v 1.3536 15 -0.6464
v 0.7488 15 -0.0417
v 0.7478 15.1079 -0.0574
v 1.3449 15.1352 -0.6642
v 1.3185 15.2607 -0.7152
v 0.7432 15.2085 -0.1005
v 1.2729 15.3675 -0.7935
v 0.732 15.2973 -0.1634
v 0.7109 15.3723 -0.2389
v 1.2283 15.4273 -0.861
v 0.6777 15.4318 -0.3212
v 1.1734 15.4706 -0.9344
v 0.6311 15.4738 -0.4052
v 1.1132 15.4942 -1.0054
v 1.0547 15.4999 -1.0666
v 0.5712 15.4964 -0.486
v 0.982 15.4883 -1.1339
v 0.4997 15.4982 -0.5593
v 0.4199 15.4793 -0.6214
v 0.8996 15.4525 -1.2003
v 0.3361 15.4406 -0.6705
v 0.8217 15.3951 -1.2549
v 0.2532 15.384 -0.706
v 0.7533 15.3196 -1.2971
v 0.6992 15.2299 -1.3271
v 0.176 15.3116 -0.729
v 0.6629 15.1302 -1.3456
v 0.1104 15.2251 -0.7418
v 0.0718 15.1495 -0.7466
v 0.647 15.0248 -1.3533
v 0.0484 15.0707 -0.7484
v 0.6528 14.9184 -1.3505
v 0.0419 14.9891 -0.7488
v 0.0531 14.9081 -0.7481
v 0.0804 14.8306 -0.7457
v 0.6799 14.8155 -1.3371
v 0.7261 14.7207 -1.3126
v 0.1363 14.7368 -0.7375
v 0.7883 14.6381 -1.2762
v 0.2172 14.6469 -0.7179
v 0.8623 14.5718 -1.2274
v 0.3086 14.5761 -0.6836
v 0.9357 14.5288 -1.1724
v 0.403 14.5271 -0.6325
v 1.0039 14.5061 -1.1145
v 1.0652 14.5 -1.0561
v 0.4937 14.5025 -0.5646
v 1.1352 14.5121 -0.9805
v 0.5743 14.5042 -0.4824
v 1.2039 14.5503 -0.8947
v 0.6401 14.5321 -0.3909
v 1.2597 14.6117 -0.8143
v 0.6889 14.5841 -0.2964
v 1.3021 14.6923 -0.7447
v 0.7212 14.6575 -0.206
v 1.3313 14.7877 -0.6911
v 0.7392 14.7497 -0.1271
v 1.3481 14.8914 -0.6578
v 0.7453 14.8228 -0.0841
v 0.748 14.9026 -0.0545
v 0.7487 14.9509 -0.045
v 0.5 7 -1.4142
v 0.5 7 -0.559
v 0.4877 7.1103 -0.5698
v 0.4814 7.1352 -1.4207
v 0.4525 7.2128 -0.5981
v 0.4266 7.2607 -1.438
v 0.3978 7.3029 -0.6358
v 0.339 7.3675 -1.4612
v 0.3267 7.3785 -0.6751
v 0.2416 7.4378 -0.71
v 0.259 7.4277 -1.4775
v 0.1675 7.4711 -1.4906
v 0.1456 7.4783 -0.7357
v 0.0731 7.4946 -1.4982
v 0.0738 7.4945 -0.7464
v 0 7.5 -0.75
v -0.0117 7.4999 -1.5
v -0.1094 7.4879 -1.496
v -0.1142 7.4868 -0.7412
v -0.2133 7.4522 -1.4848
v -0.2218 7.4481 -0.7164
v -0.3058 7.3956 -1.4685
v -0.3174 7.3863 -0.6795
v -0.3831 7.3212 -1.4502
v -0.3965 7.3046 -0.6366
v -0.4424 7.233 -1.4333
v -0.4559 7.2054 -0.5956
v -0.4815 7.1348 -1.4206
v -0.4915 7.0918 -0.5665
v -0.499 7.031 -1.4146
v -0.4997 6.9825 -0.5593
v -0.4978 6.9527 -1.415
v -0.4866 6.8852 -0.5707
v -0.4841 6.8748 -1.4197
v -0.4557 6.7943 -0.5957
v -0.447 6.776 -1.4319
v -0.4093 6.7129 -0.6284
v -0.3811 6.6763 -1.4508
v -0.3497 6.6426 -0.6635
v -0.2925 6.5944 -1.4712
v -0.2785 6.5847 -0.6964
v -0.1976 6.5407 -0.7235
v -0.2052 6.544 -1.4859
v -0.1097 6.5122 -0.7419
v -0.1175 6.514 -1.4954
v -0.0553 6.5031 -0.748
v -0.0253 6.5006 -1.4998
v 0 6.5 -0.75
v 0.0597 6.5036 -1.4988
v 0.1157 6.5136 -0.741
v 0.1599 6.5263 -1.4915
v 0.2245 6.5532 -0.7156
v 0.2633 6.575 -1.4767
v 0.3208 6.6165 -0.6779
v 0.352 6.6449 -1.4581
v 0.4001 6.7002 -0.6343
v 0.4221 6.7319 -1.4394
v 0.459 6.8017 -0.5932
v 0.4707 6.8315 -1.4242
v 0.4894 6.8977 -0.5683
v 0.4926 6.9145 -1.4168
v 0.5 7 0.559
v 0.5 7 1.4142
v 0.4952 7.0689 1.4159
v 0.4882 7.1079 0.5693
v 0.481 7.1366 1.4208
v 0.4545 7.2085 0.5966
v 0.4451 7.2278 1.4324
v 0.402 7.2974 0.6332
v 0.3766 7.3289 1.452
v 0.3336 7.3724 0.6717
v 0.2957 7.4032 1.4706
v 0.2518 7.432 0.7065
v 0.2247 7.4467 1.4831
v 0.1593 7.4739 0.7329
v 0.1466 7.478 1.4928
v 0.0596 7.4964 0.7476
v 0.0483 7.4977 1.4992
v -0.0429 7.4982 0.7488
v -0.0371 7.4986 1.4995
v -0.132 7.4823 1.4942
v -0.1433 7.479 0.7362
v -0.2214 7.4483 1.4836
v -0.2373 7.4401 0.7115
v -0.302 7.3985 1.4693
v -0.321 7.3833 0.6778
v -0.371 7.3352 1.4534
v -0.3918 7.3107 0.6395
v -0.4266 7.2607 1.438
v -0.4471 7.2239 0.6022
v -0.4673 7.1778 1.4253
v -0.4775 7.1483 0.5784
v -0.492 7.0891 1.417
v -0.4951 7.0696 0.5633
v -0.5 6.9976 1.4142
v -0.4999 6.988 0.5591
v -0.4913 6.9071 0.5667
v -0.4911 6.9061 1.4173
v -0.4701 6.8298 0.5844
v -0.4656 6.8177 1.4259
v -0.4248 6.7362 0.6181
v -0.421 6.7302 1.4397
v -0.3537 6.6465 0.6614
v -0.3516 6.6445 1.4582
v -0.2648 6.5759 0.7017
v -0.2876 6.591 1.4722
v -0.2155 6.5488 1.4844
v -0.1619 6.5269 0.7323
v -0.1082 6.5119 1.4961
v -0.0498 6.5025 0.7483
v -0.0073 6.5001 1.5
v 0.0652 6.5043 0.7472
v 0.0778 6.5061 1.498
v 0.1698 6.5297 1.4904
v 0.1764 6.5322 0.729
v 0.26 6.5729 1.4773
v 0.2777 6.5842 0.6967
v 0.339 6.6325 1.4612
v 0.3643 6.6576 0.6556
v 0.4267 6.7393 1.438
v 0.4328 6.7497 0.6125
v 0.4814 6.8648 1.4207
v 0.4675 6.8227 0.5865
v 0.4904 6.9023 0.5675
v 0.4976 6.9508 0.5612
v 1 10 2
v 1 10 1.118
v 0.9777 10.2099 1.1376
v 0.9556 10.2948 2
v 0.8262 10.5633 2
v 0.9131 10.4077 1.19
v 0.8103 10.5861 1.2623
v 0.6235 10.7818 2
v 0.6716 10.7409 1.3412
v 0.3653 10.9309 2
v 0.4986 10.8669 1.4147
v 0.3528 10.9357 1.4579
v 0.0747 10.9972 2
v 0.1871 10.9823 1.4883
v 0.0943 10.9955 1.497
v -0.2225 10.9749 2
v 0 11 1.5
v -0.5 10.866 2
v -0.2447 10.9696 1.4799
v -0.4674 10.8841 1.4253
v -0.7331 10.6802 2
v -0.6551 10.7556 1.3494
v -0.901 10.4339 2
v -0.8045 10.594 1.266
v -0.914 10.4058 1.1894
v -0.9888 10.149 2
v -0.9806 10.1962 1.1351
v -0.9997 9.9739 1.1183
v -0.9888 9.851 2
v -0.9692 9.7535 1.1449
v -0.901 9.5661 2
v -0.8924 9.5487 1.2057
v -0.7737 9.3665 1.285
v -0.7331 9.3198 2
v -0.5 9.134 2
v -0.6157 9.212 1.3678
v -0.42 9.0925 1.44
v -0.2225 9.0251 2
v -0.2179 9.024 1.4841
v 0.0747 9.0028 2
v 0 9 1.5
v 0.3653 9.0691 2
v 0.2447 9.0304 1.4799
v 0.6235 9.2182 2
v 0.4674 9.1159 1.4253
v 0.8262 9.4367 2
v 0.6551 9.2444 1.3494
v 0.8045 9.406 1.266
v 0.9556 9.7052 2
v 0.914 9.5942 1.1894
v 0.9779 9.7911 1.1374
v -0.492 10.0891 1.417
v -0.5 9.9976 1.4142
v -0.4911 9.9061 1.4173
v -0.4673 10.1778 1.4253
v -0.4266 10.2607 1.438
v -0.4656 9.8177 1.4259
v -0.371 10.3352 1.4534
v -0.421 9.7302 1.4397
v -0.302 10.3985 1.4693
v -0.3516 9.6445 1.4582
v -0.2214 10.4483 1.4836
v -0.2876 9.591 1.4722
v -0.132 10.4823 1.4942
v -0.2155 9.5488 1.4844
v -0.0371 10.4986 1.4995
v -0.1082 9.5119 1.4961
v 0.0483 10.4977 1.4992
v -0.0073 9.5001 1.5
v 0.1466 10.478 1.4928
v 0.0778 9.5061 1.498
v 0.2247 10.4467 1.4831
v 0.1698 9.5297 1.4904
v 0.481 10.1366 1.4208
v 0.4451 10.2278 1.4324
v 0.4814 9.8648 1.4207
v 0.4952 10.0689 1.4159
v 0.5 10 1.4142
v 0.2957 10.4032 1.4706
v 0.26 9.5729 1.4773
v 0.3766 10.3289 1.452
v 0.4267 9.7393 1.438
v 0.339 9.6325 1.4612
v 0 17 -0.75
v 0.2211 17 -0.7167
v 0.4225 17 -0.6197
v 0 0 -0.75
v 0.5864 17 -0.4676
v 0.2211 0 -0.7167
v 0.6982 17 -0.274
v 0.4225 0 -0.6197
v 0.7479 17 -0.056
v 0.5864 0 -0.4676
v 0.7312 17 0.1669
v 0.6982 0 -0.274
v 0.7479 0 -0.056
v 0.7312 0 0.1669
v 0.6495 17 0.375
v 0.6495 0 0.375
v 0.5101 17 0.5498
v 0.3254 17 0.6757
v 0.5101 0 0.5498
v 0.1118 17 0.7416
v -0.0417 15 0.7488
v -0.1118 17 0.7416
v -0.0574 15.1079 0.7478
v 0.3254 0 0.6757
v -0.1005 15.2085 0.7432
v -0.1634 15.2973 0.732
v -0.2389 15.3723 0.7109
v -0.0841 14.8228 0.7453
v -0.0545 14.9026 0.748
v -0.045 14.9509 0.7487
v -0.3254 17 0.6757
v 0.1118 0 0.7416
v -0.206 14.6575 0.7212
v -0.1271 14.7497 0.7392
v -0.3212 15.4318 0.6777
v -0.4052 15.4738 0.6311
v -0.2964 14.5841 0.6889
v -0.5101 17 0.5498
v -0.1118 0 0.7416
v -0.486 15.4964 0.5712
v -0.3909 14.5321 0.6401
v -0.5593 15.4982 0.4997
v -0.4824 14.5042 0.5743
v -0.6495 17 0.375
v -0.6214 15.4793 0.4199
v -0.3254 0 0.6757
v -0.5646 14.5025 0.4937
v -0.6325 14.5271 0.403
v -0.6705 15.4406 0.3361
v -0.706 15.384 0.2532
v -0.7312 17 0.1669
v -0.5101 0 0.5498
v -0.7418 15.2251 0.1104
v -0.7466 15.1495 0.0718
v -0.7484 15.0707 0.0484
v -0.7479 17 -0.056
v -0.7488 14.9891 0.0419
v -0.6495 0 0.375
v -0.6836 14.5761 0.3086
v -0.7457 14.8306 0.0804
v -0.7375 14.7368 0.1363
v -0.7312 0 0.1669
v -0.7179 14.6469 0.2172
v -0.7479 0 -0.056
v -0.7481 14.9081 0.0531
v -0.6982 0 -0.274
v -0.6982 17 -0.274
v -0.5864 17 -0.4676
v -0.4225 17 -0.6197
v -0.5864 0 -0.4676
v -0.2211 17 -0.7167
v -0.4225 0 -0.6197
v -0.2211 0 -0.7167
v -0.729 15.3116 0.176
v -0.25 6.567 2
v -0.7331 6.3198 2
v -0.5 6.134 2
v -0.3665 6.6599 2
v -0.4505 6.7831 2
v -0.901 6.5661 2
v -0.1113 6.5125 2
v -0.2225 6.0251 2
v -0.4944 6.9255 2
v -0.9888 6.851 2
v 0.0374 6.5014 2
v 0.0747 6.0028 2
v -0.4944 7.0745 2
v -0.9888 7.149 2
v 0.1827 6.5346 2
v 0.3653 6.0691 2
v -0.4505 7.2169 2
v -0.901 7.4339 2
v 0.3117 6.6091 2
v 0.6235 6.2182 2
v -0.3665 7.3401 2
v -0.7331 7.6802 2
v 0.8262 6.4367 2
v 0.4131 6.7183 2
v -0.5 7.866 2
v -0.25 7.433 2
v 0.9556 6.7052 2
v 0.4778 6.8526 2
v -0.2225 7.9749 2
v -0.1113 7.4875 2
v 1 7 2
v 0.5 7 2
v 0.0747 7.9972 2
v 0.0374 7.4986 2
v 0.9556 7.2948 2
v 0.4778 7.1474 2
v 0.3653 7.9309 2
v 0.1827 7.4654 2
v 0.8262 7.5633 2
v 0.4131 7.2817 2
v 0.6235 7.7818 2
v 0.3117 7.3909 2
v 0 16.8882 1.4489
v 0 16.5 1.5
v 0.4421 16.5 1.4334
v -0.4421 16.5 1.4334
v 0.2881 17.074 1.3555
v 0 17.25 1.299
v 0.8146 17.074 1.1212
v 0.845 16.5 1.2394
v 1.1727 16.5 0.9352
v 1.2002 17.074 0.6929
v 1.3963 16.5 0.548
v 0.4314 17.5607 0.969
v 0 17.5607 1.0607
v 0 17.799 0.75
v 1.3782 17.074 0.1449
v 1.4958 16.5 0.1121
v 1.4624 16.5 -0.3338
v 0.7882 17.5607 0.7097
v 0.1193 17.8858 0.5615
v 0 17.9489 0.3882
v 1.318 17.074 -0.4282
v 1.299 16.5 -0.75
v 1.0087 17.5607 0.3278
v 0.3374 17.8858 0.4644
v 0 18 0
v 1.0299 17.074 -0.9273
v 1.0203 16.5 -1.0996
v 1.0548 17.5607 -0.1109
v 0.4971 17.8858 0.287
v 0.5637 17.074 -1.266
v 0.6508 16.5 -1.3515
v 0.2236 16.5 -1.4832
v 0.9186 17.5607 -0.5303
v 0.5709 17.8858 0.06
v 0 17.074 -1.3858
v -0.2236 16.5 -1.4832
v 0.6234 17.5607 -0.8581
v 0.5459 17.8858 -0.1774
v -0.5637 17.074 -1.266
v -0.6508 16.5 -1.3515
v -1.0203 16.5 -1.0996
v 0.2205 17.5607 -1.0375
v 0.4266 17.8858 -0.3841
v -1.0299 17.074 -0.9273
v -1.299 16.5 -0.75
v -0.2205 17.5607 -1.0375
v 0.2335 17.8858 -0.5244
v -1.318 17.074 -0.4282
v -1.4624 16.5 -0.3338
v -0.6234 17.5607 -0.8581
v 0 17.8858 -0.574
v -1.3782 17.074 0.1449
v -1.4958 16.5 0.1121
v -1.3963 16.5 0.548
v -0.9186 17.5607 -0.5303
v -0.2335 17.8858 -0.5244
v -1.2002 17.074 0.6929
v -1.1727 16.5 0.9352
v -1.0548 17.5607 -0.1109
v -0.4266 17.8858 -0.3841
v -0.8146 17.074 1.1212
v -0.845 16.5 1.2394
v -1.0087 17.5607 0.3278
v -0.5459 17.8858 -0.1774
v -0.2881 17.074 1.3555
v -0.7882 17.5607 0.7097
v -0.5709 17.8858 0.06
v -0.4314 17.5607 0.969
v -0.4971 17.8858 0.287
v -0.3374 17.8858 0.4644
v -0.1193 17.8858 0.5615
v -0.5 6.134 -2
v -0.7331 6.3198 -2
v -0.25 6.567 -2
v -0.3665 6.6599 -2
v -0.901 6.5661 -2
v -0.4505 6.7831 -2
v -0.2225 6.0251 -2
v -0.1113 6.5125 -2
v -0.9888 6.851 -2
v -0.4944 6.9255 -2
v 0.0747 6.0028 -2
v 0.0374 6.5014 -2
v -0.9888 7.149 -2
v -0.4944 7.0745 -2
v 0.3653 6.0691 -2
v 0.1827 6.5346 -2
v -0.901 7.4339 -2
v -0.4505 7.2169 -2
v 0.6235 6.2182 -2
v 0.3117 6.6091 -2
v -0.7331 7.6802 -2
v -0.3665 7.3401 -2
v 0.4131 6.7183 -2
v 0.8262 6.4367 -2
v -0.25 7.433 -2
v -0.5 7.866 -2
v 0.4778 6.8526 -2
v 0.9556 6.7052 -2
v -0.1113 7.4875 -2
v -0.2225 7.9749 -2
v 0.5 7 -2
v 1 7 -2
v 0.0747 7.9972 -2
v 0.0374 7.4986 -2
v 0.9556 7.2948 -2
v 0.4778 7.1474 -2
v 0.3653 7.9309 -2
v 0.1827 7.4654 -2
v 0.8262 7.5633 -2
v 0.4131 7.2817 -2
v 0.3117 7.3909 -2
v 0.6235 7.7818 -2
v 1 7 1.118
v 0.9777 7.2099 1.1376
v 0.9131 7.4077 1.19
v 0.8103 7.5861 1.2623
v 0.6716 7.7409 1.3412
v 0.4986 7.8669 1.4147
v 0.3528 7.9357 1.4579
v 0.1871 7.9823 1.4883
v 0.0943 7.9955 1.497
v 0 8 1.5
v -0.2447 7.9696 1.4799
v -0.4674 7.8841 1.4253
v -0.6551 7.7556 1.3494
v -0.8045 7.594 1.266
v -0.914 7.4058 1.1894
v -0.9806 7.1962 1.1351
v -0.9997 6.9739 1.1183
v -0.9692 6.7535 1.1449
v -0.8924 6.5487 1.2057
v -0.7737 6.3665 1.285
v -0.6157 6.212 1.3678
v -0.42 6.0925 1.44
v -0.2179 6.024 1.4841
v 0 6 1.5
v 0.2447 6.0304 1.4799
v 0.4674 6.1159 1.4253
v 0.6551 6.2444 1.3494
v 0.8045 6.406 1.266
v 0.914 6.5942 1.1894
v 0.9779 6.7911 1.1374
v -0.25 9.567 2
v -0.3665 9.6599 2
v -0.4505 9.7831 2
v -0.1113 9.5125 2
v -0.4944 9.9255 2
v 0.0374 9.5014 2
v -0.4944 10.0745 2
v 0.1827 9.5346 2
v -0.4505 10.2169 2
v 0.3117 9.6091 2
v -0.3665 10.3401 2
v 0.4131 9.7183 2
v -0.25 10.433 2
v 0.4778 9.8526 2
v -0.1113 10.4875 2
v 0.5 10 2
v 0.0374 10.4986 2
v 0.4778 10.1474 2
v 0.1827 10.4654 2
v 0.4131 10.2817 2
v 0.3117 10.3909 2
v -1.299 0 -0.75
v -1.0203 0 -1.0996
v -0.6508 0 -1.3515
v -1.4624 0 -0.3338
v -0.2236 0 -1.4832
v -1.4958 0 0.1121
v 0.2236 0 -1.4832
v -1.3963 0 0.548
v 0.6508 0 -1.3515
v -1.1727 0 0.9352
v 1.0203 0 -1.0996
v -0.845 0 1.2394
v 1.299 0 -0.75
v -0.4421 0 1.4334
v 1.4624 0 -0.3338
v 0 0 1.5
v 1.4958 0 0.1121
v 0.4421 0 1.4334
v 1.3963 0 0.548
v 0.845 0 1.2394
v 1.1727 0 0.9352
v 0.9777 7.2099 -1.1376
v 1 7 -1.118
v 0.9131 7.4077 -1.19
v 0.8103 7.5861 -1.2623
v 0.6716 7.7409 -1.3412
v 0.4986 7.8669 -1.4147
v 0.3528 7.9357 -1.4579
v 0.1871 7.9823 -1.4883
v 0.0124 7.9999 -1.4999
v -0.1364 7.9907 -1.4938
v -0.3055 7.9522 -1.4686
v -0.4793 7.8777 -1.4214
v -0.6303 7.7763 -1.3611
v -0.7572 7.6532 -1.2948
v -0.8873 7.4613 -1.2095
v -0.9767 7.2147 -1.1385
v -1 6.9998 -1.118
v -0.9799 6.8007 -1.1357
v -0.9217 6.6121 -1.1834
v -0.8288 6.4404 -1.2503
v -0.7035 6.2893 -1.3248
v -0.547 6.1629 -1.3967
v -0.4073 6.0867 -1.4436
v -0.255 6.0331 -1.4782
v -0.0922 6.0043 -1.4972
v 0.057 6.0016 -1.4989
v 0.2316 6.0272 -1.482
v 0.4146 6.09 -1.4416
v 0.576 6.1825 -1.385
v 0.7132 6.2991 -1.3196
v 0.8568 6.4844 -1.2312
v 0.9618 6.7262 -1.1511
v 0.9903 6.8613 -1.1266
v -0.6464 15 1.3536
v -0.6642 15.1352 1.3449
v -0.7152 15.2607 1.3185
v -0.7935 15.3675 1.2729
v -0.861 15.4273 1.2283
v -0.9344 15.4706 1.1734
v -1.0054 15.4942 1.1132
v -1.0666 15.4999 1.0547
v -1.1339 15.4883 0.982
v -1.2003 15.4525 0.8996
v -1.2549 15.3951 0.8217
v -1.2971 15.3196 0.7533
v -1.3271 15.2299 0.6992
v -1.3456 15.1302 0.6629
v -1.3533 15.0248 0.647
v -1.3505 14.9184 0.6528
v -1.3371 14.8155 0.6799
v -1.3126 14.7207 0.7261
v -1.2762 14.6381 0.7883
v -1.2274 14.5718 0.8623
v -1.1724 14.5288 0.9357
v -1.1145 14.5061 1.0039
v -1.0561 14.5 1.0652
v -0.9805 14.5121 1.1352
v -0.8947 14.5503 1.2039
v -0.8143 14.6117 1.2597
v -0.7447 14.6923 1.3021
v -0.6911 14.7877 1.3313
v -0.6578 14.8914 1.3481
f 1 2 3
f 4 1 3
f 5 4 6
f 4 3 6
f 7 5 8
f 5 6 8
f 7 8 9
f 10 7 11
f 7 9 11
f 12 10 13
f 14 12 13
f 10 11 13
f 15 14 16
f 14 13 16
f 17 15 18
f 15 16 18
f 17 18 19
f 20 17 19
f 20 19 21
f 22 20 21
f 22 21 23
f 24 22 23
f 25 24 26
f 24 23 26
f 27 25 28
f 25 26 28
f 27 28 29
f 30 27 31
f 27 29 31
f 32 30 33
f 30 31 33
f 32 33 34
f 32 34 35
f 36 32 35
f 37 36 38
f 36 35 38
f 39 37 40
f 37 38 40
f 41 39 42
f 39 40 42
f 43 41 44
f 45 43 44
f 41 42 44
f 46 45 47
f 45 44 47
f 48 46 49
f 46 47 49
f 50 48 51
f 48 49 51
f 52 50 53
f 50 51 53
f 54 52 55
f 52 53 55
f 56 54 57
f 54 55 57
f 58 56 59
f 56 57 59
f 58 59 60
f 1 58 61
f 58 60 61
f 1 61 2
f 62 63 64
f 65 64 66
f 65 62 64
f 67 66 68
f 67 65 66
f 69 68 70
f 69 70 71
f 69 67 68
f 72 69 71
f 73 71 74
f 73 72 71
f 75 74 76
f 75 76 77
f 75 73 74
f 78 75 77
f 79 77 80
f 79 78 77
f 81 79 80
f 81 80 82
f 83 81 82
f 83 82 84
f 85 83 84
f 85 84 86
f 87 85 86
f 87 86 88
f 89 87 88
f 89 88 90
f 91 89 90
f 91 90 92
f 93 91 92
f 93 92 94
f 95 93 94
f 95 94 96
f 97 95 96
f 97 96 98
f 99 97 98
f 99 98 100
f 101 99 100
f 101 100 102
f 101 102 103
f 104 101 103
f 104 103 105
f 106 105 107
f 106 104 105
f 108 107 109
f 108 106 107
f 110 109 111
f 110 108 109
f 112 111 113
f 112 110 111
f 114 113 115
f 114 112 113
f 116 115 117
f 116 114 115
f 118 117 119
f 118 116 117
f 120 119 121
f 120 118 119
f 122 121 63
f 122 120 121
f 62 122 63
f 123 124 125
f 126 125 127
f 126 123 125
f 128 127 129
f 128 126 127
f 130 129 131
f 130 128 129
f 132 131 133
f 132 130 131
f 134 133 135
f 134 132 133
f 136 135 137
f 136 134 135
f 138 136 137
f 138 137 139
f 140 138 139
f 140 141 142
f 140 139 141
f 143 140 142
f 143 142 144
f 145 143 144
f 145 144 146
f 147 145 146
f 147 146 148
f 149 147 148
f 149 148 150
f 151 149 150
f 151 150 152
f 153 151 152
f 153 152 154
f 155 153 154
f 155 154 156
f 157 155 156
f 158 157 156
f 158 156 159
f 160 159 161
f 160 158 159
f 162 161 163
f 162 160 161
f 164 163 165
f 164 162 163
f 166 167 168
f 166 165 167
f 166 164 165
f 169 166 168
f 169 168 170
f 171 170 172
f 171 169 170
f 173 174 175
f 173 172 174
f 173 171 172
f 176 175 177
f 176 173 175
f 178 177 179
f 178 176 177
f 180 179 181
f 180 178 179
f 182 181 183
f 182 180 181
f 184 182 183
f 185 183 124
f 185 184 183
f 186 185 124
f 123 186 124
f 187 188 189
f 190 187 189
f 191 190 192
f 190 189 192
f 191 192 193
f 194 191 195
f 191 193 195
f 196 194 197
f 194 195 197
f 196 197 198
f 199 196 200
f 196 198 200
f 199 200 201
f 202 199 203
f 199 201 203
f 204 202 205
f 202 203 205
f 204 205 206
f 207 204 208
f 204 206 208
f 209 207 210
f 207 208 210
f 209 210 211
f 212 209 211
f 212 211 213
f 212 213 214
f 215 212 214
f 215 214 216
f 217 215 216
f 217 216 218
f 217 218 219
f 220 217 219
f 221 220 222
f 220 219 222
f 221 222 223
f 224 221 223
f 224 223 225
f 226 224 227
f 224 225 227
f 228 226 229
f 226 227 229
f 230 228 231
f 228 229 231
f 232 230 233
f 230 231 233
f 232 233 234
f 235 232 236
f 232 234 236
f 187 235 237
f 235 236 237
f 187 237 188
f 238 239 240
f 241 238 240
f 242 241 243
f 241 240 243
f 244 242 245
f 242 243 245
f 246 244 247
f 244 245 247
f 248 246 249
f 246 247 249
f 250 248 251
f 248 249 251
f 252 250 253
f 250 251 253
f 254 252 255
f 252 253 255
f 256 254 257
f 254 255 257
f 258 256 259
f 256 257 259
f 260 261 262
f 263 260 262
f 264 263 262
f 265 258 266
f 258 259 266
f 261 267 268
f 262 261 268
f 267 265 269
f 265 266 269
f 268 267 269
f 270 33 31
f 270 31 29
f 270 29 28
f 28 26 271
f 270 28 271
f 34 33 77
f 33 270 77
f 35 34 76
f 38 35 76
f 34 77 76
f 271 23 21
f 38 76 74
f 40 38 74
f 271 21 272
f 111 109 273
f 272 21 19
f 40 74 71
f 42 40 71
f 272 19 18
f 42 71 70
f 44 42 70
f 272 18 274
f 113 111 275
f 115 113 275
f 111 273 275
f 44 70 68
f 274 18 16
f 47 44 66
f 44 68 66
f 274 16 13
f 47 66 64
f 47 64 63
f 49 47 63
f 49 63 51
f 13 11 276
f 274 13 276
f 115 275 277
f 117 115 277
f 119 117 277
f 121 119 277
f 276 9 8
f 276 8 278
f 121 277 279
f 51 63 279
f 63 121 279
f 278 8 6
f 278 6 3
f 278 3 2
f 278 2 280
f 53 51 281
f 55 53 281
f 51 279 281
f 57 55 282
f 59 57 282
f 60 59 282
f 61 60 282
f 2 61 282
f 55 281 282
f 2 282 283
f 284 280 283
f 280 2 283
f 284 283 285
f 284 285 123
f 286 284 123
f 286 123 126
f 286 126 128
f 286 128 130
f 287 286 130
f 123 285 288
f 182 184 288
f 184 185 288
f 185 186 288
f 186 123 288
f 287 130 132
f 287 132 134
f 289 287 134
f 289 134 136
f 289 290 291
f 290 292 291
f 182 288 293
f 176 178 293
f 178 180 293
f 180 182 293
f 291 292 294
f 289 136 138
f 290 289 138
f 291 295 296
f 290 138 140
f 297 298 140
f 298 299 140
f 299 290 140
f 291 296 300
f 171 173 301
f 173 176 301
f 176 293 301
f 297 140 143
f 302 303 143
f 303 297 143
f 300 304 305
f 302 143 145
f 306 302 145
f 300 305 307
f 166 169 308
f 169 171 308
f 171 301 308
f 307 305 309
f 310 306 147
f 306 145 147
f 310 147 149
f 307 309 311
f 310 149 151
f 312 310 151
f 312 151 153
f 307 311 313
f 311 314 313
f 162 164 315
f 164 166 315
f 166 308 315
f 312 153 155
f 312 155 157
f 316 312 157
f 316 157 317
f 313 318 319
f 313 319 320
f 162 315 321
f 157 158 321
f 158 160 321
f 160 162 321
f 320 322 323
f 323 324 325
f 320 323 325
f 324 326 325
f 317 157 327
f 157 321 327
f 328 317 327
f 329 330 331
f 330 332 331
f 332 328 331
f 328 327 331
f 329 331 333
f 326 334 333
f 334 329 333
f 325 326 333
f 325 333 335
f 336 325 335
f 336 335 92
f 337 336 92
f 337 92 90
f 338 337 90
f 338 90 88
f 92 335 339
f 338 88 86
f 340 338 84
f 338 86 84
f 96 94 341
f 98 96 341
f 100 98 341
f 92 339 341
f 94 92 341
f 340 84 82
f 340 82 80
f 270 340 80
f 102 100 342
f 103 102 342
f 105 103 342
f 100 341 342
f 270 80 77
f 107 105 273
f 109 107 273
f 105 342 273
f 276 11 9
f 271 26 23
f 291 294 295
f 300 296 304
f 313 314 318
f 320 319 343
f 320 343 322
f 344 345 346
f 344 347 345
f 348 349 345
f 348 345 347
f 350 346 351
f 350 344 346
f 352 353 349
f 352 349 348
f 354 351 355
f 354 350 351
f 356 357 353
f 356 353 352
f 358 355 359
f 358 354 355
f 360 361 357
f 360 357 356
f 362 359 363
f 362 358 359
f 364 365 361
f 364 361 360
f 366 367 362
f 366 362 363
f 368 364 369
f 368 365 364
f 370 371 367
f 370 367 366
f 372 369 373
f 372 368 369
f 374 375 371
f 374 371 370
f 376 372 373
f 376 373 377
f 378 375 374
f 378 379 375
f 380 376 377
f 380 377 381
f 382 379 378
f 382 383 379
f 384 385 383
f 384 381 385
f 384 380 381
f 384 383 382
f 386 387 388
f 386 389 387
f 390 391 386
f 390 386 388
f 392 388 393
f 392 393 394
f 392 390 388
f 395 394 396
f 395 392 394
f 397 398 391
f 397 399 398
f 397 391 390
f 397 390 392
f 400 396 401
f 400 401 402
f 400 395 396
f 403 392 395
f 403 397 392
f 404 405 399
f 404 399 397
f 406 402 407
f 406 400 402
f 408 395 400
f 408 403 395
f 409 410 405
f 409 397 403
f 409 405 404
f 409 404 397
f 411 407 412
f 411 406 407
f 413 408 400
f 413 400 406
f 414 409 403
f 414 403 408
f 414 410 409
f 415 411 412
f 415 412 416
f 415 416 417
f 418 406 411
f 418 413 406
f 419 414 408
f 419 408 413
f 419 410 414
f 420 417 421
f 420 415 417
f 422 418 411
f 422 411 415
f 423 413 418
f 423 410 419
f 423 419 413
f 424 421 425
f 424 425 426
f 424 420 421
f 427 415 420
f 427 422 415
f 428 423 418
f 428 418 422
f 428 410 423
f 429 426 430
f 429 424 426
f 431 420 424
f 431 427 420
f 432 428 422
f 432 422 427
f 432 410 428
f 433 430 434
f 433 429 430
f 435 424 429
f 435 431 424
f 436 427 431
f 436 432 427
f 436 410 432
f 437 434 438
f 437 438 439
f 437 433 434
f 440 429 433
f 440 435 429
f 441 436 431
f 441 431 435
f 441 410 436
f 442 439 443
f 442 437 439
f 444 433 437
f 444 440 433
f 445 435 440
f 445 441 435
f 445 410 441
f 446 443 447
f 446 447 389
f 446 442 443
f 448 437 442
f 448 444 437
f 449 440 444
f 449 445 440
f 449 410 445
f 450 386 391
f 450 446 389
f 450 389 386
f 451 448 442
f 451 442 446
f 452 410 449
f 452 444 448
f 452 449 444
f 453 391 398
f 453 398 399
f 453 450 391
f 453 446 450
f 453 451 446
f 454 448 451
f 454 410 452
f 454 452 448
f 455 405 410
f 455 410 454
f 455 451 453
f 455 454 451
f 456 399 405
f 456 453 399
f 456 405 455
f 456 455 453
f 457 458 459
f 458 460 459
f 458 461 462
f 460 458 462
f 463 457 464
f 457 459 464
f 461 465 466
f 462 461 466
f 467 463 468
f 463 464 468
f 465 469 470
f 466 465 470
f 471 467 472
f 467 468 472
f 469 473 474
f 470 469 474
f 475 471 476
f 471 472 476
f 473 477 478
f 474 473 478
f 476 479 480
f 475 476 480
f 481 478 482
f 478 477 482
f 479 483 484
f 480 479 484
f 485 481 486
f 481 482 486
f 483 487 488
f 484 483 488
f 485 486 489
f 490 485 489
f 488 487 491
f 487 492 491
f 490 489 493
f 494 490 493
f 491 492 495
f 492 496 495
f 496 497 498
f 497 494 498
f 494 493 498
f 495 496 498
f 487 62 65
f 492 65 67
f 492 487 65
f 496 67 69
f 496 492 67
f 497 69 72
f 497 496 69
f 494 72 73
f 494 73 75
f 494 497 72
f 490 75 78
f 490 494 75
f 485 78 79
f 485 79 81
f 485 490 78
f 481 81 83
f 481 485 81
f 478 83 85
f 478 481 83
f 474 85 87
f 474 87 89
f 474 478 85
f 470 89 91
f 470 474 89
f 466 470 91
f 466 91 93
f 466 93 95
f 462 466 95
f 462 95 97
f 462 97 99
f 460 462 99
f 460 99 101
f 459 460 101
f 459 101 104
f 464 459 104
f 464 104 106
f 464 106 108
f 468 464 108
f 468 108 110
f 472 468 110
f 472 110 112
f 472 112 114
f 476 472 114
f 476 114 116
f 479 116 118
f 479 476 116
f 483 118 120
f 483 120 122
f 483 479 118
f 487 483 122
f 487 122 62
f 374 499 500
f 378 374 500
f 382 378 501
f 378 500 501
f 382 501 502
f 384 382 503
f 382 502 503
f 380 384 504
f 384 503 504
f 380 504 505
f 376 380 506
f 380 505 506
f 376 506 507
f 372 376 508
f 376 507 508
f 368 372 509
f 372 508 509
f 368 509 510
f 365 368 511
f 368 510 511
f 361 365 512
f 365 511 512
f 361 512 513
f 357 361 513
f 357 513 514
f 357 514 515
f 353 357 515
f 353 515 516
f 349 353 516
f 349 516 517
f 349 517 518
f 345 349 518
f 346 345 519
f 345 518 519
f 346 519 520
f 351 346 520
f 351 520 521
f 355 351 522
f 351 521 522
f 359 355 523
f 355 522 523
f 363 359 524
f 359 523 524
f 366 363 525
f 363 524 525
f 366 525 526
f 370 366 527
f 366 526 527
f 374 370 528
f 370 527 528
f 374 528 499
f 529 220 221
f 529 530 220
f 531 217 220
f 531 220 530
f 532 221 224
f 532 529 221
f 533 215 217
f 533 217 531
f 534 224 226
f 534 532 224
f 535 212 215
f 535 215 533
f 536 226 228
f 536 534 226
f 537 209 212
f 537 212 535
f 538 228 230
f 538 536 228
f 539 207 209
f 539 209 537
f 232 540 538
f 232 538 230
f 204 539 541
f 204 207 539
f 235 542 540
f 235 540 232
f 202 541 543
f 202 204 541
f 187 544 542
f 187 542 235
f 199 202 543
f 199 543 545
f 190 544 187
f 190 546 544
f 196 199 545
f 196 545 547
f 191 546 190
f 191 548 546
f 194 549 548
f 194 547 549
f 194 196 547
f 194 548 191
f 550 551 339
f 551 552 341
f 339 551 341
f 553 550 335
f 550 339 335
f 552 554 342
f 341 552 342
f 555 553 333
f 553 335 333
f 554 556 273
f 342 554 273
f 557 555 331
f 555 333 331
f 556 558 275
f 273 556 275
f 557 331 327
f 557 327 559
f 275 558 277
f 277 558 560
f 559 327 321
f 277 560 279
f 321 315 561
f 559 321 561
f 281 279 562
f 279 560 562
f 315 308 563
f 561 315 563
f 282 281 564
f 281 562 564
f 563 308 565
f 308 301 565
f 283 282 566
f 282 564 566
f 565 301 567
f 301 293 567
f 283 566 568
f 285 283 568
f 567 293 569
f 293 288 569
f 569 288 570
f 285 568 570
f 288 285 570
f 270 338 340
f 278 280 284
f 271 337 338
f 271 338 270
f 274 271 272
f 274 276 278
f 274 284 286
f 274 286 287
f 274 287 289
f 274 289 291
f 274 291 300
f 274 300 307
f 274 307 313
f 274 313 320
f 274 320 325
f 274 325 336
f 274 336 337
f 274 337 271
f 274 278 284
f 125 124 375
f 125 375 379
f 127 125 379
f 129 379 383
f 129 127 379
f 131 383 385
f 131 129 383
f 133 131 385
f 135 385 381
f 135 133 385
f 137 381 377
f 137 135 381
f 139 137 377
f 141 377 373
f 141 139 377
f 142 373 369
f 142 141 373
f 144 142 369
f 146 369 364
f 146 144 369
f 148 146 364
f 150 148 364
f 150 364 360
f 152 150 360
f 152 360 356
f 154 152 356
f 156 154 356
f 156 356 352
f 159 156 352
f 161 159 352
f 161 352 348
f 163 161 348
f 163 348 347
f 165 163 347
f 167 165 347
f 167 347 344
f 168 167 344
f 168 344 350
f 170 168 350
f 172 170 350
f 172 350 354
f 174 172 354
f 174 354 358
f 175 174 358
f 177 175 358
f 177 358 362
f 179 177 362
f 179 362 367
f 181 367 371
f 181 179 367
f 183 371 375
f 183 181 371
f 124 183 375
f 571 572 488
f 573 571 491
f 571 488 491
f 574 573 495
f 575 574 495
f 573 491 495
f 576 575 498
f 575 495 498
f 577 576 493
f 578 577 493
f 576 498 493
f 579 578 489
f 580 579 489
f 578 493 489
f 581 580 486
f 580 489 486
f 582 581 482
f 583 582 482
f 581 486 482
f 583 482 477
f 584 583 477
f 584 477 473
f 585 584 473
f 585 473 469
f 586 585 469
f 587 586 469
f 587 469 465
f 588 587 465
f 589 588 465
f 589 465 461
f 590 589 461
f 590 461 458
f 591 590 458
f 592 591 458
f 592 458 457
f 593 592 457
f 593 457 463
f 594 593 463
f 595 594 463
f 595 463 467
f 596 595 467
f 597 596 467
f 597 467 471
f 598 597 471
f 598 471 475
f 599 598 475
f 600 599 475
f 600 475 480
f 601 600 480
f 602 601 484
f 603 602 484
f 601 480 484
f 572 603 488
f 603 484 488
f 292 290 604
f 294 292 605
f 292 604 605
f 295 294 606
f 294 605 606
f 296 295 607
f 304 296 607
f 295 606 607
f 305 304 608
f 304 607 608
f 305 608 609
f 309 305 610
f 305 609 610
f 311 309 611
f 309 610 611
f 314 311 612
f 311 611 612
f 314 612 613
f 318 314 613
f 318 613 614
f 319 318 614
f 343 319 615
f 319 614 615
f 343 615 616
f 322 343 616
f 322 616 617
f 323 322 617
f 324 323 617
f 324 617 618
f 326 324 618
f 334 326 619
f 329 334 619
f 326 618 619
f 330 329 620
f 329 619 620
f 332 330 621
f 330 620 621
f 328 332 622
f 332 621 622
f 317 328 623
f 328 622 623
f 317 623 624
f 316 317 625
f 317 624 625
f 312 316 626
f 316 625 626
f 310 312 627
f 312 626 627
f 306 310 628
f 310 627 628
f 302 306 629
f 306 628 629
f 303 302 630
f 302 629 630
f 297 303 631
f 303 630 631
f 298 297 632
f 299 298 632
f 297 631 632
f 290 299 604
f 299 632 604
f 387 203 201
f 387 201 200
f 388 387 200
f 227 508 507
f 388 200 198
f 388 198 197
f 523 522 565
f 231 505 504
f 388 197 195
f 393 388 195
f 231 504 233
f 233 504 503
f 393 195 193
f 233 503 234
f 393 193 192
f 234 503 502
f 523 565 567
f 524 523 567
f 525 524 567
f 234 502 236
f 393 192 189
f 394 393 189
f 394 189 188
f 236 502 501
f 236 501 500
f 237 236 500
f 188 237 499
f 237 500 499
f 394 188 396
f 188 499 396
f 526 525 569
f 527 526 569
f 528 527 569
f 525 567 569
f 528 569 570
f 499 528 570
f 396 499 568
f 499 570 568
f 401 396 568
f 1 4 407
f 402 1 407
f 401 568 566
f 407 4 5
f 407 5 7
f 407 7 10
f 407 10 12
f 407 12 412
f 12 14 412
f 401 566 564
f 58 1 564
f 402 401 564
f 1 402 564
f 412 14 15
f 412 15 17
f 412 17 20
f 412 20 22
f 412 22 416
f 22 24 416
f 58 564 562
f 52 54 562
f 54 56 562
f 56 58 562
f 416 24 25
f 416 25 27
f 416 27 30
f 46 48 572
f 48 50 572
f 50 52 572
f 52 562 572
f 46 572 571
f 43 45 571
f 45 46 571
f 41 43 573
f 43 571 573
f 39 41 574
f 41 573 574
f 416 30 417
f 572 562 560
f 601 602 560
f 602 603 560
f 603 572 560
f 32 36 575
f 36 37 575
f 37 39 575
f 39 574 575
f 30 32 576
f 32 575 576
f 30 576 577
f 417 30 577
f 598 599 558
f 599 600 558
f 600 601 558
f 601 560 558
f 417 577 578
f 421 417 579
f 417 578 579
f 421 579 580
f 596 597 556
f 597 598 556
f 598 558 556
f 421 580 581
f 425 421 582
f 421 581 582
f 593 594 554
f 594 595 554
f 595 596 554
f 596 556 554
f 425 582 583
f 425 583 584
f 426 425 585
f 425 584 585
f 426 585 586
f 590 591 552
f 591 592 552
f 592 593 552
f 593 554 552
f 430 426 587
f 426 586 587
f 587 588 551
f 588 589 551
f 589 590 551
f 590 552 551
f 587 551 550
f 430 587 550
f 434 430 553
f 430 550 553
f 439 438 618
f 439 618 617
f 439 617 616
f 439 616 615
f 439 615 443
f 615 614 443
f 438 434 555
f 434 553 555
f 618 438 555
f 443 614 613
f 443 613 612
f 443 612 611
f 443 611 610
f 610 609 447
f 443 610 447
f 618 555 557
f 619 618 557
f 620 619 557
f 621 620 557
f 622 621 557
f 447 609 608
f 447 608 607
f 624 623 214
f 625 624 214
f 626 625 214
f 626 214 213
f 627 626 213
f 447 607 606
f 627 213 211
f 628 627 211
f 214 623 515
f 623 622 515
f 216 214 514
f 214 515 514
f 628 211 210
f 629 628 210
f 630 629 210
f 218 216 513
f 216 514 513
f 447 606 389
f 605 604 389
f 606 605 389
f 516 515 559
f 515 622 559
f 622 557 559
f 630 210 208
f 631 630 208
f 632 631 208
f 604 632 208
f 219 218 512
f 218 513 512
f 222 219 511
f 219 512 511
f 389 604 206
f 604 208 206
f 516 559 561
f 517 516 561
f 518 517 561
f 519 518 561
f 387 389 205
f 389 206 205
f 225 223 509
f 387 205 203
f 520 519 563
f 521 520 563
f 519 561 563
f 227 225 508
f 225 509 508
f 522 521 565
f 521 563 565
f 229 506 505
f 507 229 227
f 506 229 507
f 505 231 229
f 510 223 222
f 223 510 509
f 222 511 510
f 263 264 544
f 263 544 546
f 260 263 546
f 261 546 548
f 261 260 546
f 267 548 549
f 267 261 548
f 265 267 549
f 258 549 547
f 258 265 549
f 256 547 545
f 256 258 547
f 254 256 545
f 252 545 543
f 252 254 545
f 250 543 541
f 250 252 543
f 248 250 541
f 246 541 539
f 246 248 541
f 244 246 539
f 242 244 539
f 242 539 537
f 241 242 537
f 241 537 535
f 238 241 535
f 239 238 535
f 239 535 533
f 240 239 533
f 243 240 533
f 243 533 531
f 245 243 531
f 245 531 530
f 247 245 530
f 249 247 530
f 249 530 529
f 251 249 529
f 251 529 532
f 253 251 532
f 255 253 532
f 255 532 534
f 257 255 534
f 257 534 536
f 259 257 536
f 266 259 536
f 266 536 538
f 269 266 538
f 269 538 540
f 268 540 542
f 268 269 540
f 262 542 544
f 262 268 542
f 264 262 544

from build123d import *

# Parameters (mm, degrees)
SKETCH1_R               = 1.5
BOSS_EXTRUDE1_DEPTH     = 18
FILLET1_R               = 1.5
SKETCH2_R               = 1
SKETCH2_R_2             = 0.5
EXTRUDE_THIN1_DEPTH     = 2
EXTRUDE_THIN2_START     = -2
SKETCH2_2_R             = 1
SKETCH2_2_R_2           = 0.5
EXTRUDE_THIN2_DEPTH     = 2
CUT_EXTRUDE1_DEPTH      = 19.172781865
CUT_EXTRUDE1_DEPTH_BACK = 19.172781865
SKETCH3_R               = 0.5
SKETCH4_R               = 0.5
CUT_EXTRUDE2_DEPTH      = 3
SKETCH5_R               = 0.75
CUT_EXTRUDE3_DEPTH      = 17


with BuildPart() as part:
    # Sketch1 → Boss-Extrude1 (new body)
    with BuildSketch(Plane(origin=(0, 0, 0), x_dir=(1, 0, 0), z_dir=(0, 1, 0))):
        Circle(SKETCH1_R)
    extrude(amount=BOSS_EXTRUDE1_DEPTH)

    # Fillet1
    fillet1_edges = [part.edges().sort_by_distance(p)[0] for p in [
        (-1.5, 18, 0),
    ]]
    fillet(fillet1_edges, radius=FILLET1_R)

    # Sketch2 → Extrude-Thin1 (add)
    # profile 1 of 2: a face of its own
    with BuildSketch(Plane.XY):
        with Locations((0, 7)):
            Circle(SKETCH2_R)
        with Locations((0, 7)):
            Circle(SKETCH2_R_2, mode=Mode.SUBTRACT)
    # profile 2 of 2: a face of its own
    with BuildSketch(Plane.XY):
        with Locations((0, 10)):
            Circle(SKETCH2_R)
        with Locations((0, 10)):
            Circle(SKETCH2_R_2, mode=Mode.SUBTRACT)
    extrude(amount=EXTRUDE_THIN1_DEPTH)

    # Sketch2<2> → Extrude-Thin2 (add)
    with BuildSketch(Plane.XY.offset(EXTRUDE_THIN2_START)):
        with Locations((0, 7)):
            Circle(SKETCH2_2_R)
        with Locations((0, 7)):
            Circle(SKETCH2_2_R_2, mode=Mode.SUBTRACT)
    extrude(amount=EXTRUDE_THIN2_DEPTH)

    # Sketch3 → Cut-Extrude1 (cut, two sides: drawn at the far end of the back side and taken through both)
    with BuildSketch(Plane.XY.offset(-CUT_EXTRUDE1_DEPTH_BACK)):
        with Locations((0, 7)):
            Circle(SKETCH3_R)
    extrude(amount=CUT_EXTRUDE1_DEPTH + CUT_EXTRUDE1_DEPTH_BACK, mode=Mode.SUBTRACT)

    # Sketch4 → Cut-Extrude2 (cut, symmetric)
    with BuildSketch(Plane(origin=(0, 0, 0), x_dir=(0.7071067811865477, 0, 0.7071067811865475), z_dir=(-0.7071067811865475, 0, 0.7071067811865477))):
        with Locations((0, 15)):
            Circle(SKETCH4_R)
    extrude(amount=CUT_EXTRUDE2_DEPTH, both=True, mode=Mode.SUBTRACT)

    # Sketch5 → Cut-Extrude3 (cut)
    with BuildSketch(Plane.XZ):
        Circle(SKETCH5_R)
    extrude(amount=-CUT_EXTRUDE3_DEPTH, mode=Mode.SUBTRACT)


solid = part.part
